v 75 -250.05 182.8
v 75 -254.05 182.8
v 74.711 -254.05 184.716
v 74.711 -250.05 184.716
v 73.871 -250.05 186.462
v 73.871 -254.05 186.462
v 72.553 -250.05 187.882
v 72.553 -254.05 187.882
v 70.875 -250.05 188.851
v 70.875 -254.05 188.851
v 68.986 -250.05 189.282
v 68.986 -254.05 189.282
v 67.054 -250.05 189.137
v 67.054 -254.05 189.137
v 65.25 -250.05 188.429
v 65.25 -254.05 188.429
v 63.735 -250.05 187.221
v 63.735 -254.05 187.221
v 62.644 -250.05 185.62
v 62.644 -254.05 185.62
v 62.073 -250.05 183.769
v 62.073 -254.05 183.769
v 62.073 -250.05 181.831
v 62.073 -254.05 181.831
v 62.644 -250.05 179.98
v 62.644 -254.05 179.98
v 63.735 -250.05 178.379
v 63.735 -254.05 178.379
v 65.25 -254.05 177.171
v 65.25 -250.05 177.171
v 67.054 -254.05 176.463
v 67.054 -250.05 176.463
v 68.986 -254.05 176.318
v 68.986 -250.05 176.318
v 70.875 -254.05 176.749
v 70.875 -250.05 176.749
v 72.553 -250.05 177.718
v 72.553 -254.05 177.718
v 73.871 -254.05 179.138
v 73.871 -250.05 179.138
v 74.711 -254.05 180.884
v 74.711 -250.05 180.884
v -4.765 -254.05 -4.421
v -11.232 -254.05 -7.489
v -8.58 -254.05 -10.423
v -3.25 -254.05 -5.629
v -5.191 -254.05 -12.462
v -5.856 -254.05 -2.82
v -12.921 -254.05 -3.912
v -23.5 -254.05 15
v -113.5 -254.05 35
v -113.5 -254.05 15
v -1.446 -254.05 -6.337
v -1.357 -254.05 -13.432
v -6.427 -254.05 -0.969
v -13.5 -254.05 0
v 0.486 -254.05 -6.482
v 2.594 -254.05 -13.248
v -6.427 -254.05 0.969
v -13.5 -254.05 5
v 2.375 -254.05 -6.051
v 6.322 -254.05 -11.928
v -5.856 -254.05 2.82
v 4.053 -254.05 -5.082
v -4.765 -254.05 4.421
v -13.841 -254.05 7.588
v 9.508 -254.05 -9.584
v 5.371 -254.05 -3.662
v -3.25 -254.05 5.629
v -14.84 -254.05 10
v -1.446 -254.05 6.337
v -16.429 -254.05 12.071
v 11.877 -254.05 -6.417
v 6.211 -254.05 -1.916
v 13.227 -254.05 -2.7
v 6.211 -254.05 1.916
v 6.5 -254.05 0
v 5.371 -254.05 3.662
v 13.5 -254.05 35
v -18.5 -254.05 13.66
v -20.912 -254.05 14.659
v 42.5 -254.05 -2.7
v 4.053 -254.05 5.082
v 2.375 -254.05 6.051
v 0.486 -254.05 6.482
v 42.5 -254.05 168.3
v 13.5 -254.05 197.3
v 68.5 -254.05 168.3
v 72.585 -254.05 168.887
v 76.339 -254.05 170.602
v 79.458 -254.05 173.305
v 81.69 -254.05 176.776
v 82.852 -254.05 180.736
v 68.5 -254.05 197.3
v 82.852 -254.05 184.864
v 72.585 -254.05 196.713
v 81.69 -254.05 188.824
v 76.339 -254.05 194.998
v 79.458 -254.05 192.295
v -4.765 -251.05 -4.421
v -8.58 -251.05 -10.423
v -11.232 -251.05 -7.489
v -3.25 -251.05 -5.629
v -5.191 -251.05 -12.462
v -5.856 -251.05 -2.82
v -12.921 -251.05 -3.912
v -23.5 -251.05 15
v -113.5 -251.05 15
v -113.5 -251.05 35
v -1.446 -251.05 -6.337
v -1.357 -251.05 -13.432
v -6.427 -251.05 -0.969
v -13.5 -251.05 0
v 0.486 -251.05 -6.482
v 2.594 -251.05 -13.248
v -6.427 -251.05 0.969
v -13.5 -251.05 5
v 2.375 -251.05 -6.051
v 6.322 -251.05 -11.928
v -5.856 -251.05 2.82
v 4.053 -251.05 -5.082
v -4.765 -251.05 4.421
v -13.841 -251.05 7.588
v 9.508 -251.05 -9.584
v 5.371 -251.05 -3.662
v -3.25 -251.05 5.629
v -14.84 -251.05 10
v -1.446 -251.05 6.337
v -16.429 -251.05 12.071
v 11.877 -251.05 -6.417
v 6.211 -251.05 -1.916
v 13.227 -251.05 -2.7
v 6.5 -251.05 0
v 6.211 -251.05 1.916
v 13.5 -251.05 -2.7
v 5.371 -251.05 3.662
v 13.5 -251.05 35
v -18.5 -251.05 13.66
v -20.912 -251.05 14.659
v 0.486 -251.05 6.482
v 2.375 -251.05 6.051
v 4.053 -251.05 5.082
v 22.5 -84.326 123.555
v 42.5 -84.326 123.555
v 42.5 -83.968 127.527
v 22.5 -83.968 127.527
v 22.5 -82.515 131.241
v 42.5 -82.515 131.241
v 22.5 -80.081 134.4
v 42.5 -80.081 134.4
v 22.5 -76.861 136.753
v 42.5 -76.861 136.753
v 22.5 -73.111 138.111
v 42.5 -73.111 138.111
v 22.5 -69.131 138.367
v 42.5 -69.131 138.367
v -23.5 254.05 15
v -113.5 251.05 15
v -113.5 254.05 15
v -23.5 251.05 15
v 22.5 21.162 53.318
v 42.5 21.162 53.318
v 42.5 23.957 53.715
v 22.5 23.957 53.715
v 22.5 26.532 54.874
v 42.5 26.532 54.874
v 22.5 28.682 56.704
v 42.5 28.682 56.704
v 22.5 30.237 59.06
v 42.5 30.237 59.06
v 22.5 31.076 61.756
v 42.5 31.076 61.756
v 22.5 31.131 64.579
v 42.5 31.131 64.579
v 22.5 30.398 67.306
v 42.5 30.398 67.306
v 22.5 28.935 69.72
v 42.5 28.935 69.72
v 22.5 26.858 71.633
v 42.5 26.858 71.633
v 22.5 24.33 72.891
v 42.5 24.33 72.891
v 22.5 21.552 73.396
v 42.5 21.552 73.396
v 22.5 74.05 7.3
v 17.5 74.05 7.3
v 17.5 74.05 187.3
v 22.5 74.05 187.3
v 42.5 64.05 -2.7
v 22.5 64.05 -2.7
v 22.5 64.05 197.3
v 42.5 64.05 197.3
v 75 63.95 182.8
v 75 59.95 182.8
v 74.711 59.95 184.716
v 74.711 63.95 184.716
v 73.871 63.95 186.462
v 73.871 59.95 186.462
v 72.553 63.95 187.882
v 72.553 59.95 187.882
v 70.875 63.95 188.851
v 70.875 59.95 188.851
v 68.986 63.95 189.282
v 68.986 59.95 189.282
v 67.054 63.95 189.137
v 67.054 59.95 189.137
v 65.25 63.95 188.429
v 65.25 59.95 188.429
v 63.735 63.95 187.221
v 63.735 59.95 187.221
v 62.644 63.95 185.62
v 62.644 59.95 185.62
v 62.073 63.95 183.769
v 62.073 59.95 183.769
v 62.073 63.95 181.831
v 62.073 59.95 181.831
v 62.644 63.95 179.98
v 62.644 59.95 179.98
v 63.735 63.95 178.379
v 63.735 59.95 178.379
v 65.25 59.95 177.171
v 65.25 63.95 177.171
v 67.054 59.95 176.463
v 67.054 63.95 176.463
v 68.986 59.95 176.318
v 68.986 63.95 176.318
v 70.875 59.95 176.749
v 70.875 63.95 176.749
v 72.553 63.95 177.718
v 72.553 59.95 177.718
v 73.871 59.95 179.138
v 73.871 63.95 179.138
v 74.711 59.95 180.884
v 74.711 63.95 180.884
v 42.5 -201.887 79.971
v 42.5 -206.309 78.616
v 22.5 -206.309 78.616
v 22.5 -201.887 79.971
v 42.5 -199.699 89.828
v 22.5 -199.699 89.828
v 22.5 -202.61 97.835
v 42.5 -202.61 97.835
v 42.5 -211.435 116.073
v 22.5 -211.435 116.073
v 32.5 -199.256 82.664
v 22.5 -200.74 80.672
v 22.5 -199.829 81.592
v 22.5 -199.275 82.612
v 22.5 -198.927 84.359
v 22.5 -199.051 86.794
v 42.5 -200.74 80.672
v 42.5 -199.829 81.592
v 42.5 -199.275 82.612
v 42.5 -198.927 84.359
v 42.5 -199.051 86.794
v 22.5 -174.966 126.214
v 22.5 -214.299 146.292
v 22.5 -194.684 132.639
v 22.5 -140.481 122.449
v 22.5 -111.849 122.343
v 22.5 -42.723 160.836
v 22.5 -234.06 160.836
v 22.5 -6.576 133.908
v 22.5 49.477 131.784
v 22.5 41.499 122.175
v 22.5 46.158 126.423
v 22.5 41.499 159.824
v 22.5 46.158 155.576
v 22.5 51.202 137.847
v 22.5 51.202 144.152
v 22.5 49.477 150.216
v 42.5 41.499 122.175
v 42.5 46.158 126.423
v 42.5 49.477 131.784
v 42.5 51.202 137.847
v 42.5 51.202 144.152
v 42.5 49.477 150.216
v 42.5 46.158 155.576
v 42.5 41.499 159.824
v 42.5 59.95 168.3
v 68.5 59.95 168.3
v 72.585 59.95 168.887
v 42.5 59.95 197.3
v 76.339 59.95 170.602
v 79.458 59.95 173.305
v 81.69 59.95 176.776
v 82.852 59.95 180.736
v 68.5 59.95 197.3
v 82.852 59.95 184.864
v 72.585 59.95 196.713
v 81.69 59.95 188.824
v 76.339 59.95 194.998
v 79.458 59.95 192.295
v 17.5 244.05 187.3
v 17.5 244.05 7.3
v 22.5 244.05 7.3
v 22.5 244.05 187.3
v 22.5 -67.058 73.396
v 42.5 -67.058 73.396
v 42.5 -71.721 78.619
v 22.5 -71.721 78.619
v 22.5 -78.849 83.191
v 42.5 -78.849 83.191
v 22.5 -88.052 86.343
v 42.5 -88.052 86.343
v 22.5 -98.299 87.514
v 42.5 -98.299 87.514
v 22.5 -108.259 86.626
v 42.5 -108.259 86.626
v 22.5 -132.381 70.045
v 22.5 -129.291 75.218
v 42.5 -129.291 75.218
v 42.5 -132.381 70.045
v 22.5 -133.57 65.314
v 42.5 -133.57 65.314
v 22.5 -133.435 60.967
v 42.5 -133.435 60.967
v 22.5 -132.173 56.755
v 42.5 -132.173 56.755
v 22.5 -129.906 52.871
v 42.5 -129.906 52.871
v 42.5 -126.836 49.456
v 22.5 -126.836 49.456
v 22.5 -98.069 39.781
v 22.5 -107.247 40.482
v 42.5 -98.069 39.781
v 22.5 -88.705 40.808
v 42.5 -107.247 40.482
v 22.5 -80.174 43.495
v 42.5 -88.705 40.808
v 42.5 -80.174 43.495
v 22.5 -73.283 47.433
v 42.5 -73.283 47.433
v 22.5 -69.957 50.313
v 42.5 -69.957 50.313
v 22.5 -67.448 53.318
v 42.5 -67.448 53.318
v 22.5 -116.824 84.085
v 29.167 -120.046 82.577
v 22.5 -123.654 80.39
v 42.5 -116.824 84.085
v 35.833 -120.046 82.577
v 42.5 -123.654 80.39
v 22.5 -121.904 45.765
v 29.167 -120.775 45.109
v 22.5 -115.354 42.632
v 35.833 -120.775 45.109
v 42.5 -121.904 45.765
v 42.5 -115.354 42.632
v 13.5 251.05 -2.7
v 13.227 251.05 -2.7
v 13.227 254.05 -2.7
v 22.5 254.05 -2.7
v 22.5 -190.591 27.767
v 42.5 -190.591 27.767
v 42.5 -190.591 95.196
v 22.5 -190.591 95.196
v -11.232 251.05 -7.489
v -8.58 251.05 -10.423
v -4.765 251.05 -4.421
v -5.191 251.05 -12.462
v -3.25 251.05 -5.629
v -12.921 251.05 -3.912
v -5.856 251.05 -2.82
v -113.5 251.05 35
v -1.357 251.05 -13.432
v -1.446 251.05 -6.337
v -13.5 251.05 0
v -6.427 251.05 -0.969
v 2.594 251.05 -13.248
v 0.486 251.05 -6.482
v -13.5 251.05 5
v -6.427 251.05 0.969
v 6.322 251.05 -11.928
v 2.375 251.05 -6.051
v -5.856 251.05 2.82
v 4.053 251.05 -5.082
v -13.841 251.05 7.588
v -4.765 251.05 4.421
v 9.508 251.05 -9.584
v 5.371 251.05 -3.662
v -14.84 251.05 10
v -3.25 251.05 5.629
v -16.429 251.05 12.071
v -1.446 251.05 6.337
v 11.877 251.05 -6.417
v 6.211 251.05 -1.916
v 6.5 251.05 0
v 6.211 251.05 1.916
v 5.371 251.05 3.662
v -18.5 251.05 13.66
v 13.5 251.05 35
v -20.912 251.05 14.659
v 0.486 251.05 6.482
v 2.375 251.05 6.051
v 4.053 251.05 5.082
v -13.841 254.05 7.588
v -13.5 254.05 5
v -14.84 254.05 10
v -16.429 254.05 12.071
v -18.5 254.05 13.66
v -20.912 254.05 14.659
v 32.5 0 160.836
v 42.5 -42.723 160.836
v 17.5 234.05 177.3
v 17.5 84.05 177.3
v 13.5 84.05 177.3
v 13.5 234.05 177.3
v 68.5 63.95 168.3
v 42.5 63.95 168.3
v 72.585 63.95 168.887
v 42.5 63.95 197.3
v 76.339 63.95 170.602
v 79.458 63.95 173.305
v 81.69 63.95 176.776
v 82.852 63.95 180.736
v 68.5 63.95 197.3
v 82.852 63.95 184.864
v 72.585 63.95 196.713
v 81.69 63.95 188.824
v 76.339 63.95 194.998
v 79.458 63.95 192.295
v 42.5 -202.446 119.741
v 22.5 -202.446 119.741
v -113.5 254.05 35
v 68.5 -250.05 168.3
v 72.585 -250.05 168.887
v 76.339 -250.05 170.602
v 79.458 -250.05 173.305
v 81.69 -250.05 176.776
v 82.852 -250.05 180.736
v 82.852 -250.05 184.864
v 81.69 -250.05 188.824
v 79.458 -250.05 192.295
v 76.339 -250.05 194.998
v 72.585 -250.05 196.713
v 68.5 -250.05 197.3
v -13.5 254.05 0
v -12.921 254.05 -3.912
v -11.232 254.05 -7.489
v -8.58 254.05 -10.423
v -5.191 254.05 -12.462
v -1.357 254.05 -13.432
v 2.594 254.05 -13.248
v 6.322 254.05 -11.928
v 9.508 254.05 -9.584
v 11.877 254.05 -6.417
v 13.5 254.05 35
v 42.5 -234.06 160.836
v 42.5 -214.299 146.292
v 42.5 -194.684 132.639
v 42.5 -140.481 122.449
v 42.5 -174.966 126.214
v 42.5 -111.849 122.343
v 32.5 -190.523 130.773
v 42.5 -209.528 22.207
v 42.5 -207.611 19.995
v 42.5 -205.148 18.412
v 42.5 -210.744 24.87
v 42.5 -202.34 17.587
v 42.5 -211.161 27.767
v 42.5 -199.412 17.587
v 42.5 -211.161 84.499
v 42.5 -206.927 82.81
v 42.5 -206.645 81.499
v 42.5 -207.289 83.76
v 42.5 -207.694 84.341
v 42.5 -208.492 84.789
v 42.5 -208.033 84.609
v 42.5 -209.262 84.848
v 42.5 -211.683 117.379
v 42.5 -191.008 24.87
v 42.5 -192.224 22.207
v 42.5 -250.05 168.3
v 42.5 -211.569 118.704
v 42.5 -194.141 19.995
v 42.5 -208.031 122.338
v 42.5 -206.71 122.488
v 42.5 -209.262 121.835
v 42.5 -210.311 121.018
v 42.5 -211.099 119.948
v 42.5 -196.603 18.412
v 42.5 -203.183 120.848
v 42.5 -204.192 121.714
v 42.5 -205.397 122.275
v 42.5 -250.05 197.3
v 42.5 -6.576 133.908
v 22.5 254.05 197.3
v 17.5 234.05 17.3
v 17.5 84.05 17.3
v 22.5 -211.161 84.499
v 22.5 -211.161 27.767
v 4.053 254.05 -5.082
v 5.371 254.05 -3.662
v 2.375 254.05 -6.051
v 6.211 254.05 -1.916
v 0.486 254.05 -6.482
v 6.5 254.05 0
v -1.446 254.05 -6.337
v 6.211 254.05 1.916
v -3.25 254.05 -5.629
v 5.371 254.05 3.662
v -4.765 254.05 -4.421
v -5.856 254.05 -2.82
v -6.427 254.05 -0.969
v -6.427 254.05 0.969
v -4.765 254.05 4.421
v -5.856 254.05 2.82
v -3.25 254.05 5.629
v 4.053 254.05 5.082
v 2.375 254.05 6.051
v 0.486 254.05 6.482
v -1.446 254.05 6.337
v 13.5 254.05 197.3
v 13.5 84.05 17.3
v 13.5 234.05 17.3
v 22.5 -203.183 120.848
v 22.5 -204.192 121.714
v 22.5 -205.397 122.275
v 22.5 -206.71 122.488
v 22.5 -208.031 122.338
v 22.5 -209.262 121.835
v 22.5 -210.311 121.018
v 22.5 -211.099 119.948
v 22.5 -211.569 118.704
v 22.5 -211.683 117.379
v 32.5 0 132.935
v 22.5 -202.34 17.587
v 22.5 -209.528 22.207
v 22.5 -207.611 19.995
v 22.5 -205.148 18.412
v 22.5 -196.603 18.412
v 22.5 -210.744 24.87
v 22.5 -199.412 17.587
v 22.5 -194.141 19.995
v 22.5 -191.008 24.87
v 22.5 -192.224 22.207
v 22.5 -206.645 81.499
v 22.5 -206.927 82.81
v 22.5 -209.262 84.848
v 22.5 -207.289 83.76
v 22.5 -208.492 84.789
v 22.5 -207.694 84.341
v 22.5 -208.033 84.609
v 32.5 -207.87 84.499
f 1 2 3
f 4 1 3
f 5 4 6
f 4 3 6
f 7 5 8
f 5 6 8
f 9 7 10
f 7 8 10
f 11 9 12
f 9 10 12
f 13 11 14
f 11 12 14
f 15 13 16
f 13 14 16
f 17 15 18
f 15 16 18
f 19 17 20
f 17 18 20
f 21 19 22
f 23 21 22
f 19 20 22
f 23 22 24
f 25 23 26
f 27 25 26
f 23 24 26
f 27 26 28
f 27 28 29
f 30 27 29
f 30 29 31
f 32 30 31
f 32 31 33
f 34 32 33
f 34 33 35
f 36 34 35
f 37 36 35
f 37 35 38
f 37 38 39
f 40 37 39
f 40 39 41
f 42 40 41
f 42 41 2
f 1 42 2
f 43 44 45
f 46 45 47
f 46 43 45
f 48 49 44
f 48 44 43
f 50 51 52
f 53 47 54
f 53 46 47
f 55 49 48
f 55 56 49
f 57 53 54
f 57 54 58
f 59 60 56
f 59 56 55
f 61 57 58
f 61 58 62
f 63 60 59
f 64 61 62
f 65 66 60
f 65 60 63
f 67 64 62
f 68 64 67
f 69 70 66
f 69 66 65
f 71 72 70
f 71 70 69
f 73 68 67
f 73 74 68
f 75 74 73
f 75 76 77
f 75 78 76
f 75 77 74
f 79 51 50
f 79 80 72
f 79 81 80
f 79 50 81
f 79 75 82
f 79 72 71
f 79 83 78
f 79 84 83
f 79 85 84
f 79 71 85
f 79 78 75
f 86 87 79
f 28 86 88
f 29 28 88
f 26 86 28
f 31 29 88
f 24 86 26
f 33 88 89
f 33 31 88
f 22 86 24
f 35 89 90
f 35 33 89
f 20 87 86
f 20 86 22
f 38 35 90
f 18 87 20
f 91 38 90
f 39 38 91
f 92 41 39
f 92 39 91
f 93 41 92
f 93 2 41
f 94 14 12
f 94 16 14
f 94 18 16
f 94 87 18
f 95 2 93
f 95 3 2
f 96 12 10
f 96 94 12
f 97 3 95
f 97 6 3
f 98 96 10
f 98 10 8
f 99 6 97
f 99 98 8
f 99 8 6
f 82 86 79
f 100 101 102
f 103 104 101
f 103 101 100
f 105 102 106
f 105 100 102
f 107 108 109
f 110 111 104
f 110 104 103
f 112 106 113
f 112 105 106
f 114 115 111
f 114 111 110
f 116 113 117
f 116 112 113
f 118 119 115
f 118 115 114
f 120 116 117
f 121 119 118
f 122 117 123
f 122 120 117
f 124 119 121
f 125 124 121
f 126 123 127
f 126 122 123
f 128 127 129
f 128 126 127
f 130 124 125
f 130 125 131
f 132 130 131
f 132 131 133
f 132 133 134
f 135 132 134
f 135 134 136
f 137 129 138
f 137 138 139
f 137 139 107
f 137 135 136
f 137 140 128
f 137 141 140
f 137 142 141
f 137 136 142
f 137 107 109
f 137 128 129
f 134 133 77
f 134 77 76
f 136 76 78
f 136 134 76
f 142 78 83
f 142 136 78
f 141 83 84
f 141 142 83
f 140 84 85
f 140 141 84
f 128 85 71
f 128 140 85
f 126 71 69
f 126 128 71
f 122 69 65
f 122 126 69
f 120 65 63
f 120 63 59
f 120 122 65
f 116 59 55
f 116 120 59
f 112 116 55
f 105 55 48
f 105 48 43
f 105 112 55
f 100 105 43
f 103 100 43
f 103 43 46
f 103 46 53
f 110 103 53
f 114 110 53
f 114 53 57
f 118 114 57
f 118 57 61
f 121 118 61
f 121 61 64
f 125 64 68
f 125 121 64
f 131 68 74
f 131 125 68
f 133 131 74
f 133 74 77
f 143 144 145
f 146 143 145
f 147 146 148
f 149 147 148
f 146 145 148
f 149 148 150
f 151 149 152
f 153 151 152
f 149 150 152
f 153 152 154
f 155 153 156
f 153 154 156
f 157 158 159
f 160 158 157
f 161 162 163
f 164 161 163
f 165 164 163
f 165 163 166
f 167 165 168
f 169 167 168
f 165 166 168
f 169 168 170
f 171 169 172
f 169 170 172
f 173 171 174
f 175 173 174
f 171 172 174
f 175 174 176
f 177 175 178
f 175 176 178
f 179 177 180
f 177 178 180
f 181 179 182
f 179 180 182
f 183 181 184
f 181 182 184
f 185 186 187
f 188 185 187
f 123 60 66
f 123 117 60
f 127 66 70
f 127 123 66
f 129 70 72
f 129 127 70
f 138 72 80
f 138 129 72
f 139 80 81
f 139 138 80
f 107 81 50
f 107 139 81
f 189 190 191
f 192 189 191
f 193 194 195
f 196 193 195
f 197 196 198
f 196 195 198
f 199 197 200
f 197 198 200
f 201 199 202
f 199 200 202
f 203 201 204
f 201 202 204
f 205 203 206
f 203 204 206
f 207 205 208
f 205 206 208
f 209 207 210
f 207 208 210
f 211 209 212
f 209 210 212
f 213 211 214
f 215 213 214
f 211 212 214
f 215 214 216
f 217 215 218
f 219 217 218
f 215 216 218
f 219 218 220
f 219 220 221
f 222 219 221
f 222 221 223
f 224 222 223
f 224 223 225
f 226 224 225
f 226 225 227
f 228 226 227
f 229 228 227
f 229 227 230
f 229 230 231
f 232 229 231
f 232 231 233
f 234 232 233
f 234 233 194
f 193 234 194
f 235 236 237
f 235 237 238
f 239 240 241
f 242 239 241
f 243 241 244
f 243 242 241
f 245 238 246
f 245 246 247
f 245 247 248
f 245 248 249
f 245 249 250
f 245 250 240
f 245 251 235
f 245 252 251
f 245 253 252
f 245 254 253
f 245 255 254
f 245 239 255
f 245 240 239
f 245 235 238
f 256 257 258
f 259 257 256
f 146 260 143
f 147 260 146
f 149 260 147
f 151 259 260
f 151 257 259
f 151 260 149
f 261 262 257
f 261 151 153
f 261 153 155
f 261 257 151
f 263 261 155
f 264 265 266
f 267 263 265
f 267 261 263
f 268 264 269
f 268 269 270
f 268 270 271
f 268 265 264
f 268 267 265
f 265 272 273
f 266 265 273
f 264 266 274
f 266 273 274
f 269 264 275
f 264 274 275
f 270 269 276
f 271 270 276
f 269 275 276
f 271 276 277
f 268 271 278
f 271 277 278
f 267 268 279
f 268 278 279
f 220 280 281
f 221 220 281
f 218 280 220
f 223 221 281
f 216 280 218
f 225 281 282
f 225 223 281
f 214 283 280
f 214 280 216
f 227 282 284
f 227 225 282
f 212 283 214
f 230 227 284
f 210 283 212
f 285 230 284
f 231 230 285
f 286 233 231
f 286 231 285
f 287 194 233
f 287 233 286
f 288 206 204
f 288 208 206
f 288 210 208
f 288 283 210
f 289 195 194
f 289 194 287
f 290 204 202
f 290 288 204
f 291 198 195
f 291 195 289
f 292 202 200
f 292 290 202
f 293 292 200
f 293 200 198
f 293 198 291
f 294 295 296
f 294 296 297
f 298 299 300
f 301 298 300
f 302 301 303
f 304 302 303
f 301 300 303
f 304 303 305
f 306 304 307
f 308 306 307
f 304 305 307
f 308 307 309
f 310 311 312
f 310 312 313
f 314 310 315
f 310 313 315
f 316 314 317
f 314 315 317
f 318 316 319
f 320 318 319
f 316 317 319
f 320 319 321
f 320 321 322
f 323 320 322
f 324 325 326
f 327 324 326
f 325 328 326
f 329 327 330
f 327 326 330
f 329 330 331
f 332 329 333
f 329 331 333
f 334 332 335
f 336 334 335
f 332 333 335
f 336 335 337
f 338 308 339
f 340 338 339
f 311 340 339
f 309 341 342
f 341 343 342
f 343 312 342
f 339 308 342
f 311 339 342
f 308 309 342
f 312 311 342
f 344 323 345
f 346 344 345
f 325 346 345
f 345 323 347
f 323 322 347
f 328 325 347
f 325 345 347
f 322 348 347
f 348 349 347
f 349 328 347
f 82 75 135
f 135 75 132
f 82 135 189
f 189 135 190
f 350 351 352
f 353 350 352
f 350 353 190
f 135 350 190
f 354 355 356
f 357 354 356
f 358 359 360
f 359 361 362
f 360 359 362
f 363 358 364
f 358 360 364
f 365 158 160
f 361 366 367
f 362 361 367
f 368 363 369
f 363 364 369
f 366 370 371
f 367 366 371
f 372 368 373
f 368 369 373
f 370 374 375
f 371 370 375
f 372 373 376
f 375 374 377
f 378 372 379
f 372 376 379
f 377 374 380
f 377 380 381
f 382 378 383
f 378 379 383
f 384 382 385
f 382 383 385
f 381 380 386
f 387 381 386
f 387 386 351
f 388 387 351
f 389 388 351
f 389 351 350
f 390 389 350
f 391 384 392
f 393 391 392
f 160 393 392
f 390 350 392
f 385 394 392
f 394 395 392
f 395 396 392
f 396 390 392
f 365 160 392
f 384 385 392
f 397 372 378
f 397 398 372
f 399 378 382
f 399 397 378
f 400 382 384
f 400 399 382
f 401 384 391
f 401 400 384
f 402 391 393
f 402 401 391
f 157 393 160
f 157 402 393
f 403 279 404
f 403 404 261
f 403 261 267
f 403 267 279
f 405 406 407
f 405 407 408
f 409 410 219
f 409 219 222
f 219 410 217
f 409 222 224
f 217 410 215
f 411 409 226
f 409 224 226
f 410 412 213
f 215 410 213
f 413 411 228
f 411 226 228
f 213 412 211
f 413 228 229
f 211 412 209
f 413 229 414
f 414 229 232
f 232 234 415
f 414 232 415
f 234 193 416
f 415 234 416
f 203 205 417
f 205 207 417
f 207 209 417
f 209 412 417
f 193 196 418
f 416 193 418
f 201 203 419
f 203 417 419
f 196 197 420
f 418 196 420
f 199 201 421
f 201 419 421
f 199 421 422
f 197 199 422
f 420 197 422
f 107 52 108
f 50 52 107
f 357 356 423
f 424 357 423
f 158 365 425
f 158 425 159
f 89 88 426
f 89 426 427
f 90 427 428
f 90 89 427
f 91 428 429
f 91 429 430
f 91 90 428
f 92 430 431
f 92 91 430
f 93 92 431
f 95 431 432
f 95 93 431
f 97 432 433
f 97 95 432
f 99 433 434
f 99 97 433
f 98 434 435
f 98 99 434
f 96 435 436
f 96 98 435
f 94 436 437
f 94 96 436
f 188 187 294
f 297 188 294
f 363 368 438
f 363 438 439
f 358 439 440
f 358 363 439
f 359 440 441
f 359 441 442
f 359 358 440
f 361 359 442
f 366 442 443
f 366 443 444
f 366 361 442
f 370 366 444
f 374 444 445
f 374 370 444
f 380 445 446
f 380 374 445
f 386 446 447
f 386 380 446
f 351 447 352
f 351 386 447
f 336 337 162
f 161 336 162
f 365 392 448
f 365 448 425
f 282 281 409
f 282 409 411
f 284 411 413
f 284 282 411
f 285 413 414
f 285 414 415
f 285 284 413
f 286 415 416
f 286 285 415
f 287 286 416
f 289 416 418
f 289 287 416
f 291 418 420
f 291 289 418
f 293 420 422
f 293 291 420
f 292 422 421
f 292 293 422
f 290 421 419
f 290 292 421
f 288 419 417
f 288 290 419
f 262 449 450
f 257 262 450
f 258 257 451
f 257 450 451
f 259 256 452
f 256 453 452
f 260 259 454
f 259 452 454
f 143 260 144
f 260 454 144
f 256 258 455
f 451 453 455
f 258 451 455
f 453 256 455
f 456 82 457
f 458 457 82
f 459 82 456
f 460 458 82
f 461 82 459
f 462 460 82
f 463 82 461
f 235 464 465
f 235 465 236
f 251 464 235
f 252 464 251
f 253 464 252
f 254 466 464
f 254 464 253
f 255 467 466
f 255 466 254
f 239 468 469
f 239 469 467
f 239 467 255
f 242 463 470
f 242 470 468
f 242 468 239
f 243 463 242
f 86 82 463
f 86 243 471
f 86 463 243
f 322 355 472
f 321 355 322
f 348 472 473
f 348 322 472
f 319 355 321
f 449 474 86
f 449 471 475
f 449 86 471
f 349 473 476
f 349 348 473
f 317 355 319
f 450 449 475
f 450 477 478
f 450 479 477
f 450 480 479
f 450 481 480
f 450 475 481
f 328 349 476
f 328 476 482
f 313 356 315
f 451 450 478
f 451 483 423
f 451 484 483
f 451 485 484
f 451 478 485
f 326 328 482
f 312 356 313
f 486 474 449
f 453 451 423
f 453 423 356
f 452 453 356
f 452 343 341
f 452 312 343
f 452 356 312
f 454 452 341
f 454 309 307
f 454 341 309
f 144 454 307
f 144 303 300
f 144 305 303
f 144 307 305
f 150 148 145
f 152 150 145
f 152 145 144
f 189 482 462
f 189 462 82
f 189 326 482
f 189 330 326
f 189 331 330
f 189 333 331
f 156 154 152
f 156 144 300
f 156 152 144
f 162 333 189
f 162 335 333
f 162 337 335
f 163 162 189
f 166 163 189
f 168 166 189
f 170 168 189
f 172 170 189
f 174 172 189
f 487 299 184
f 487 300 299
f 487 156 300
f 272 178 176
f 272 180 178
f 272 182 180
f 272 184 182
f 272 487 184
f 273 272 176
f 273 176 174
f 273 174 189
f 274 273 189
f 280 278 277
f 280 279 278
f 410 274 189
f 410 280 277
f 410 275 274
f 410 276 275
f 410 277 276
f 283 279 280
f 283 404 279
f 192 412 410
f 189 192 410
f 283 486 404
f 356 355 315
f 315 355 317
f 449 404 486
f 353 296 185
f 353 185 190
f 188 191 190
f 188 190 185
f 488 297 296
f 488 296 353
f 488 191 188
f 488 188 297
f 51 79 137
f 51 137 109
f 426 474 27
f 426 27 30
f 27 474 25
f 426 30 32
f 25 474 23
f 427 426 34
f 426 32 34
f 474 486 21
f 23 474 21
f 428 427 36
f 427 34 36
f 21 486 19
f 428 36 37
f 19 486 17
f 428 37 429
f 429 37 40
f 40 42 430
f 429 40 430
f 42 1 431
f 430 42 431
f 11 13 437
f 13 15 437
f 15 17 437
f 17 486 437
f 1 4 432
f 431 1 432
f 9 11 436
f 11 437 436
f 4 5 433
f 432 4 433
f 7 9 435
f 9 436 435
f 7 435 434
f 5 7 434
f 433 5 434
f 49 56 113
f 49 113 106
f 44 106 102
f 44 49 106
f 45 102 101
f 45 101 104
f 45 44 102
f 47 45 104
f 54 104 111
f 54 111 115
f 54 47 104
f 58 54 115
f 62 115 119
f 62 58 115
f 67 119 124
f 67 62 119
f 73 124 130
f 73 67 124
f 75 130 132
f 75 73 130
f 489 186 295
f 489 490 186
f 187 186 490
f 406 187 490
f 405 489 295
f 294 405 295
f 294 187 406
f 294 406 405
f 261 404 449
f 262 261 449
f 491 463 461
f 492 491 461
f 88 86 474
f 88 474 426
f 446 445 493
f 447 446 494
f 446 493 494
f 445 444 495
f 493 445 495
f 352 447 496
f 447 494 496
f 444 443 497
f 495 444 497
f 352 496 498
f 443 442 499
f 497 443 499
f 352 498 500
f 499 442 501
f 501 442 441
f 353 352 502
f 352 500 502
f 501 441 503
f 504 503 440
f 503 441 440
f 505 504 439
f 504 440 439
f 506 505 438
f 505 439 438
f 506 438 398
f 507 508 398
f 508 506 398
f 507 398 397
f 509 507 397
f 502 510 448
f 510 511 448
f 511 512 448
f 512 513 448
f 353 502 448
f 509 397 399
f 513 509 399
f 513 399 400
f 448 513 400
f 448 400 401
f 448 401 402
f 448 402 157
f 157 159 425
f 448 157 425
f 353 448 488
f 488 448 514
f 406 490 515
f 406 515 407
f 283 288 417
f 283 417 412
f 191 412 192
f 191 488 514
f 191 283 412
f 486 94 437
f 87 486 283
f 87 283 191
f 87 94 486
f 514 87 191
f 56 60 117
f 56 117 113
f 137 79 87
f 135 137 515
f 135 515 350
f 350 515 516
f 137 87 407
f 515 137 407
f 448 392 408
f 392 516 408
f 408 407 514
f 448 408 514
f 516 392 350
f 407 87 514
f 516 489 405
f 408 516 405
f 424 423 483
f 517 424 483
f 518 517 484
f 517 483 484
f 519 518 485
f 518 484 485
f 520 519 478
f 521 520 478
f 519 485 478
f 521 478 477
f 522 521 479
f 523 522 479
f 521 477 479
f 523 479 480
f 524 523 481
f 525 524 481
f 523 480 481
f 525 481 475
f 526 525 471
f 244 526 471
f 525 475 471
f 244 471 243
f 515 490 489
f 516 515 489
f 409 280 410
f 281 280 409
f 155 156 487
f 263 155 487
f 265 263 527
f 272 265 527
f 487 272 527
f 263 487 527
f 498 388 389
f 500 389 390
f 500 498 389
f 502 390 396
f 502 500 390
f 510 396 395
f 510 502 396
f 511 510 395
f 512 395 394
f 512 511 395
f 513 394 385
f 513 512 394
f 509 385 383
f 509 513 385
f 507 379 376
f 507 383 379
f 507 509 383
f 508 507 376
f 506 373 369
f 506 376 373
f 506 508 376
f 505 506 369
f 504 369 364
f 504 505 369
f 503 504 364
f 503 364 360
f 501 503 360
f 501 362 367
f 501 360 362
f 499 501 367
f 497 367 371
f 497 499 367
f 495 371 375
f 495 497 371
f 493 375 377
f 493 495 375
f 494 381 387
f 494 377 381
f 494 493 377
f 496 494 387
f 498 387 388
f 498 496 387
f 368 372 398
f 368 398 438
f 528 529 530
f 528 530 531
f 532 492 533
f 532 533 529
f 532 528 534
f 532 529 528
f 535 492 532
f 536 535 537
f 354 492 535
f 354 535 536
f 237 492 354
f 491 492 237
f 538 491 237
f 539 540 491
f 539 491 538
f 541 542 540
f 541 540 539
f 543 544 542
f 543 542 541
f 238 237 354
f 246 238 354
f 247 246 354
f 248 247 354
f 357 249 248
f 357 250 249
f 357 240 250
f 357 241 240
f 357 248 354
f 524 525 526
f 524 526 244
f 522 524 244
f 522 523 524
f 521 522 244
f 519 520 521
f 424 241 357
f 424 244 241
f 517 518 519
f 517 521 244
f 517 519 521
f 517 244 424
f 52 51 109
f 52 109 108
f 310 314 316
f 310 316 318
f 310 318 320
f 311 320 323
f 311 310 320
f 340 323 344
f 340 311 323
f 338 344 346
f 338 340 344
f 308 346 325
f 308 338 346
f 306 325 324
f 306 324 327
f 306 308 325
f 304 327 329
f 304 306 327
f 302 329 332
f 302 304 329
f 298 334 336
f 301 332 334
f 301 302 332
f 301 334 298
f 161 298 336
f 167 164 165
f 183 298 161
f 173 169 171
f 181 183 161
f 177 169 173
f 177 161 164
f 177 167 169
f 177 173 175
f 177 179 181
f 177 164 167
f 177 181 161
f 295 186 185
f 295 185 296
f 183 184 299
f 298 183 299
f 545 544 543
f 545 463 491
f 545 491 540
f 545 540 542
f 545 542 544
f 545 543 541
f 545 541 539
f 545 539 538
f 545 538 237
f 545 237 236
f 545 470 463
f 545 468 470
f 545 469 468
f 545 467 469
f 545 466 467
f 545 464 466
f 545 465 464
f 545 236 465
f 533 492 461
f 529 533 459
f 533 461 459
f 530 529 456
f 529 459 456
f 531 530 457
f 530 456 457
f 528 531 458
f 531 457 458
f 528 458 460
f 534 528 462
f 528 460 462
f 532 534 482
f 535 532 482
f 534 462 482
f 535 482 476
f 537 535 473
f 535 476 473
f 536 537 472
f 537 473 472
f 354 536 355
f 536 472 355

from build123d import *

# Parameters (mm, degrees)
F0_R      = 6.5
F1_DEPTH  = 254.05
F2_W      = 502.1
F2_H      = 100
F3_DEPTH  = 140
F4_R      = 10
F5_W      = 508.1
F5_H      = 200
F6_DEPTH  = 4
F7_W      = 150
F7_H      = 160
F8_DEPTH  = 25
F9_W      = 190
F9_H      = 200
F10_DEPTH = 5
F11_W     = 170
F11_H     = 180
F12_DEPTH = 25
F13_W     = 318.1
F13_H     = 200
F14_DEPTH = 25
F16_DEPTH = 20
F17_R     = 6.5
F18_DEPTH = 318
F19_W     = 52
F19_H     = 310
F20_DEPTH = 30


with BuildPart() as f1:
    # F0 (on Front) → F1 (new body, symmetric)
    with BuildSketch(Plane.XZ):
        with BuildLine():
            Line((-13.5, 15), (-13.5, 0))
            ThreePointArc((-13.5, 0), (-1.3568709871, -13.4316380656), (13.227244611, -2.7))
            Line((13.227244611, -2.7), (13.5, -2.7))
            Line((13.5, -2.7), (13.5, 15))
            Line((13.5, 15), (13.5, 35))
            Line((13.5, 35), (-113.5, 35))
            Line((-113.5, 35), (-113.5, 15))
            Line((-113.5, 15), (-13.5, 15))
        make_face()
        Circle(F0_R, mode=Mode.SUBTRACT)
    extrude(amount=F1_DEPTH, both=True)

    # F2 (on face) → F3 (cut)
    with BuildSketch(Plane.YZ.offset(13.5)):
        Rectangle(F2_W, F2_H)
    extrude(amount=-F3_DEPTH, mode=Mode.SUBTRACT)

    # F4
    f4_edges = [f1.edges().sort_by_distance(p)[0] for p in [
        (-13.5, -252.55, 15),
        (-13.5, 252.55, 15),
    ]]
    fillet(f4_edges, radius=F4_R)

    # F5 (on face) → F6 (join)
    with BuildSketch(Plane.YZ.offset(13.5)):
        with Locations((0, 97.3)):
            Rectangle(F5_W, F5_H)
    extrude(amount=F6_DEPTH)

    # F7 (on face) → F8 (cut)
    with BuildSketch(Plane.YZ.offset(17.5)):
        with Locations((159.05, 97.3)):
            Rectangle(F7_W, F7_H)
    extrude(amount=-F8_DEPTH, mode=Mode.SUBTRACT)

    # F9 (on face) → F10 (join)
    with BuildSketch(Plane.YZ.offset(17.5)):
        with Locations((159.05, 97.3)):
            Rectangle(F9_W, F9_H)
    extrude(amount=F10_DEPTH)

    # F11 (on face) → F12 (cut)
    with BuildSketch(Plane.YZ.offset(17.5)):
        with Locations((159.05, 97.3)):
            Rectangle(F11_W, F11_H)
    extrude(amount=F12_DEPTH, mode=Mode.SUBTRACT)

    # F13 (on face) → F14 (join)
    with BuildSketch(Plane.YZ.offset(17.5)):
        with Locations((-95, 97.3)):
            Rectangle(F13_W, F13_H)
    extrude(amount=F14_DEPTH)

    # F15 (on face) → F16 (cut)
    with BuildSketch(Plane.YZ.offset(42.5)):
        with BuildLine():
            Line((-42.7234955132, 160.8355042394), (-234.0602389828, 160.8355042394))
            add(Edge.make_bspline(
                [(-234.0602389828, 160.8355042394), (-217.1074327426, 151.3089947091), (-196.7785844767, 119.4842501759), (-119.2925410931, 121.4843631106), (-84.3255399594, 123.5550247597)],
                knots=[0, 0, 0, 0, 0.4134970992, 1, 1, 1, 1], degree=3))
            ThreePointArc((-84.3255399594, 123.5550247597), (-80.0809052846, 134.4004465368), (-69.1307716391, 138.367141659))
            add(Edge.make_bspline(
                [(-69.1307716391, 138.367141659), (-47.0103981225, 137.0126396602), (1.6618247246, 135.6066305681), (26.4505103488, 126.2112086953), (41.4993381181, 122.1753671593)],
                knots=[0, 0, 0, 0, 0.5598213266, 1, 1, 1, 1], degree=3))
            ThreePointArc((41.4993381181, 122.1753671593), (51.4208114186, 140.9997574198), (41.4993381181, 159.8241476803))
            add(Edge.make_bspline(
                [(-42.7234955132, 160.8355042394), (-27.0416883232, 160.9222176304), (-1.4651588493, 161.1197494684), (29.1631212378, 160.1908804879), (41.4993381181, 159.8241476803)],
                knots=[0, 0, 0, 0, 0.5035967712, 1, 1, 1, 1], degree=3))
        make_face()
        with BuildLine():
            Line((21.5523498238, 73.3963885321), (-67.0575042699, 73.3963885321))
            add(Edge.make_bspline(
                [(-67.0575042699, 73.3963885321), (-85.0711185917, 100.9948365173), (-120.0462196172, 82.577282884), (-155.0213206427, 64.1597292506), (-120.7750741023, 45.1092301127), (-86.5288275619, 26.0587309749), (-67.4480830546, 53.317995912)],
                knots=[0.4207699255, 0.4207699255, 0.4207699255, 2.2257610437, 2.2257610437, 4.0307521619, 4.0307521619, 5.83574328, 5.83574328, 5.83574328], degree=2, weights=[1, 0.6196531961, 1, 0.6196531961, 1, 0.6196531961, 1]))
            Line((-67.4480830546, 53.317995912), (21.1617710391, 53.317995912))
            ThreePointArc((21.1617710391, 53.317995912), (31.2028666218, 63.1656647881), (21.5523498238, 73.3963885321))
        make_face()
        with BuildLine():
            ThreePointArc((-211.1607789993, 27.7673769742), (-200.8758932352, 17.4824912101), (-190.5910074711, 27.7673769742))
            Line((-190.5910074711, 27.7673769742), (-190.5910074711, 78.6157455295))
            Line((-190.5910074711, 78.6157455295), (-190.5910074711, 95.1955616474))
            Line((-190.5910074711, 95.1955616474), (-202.446475625, 119.7409853339))
            ThreePointArc((-202.446475625, 119.7409853339), (-208.6635845365, 122.1287897822), (-211.4351242781, 116.0729974508))
            add(Edge.make_bspline(
                [(-206.3090205193, 78.6157455295), (-203.2636096895, 79.3219361096), (-193.8499770894, 81.5048332746), (-204.3392460287, 102.1242097799), (-211.4351242781, 116.0729974508)],
                knots=[0, 0, 0, 0, 0.3235106955, 1, 1, 1, 1], degree=3))
            add(Edge.make_bspline(
                [(-211.1607789993, 84.4994708896), (-209.9125958931, 84.8049572899), (-206.9667390663, 85.5259406083), (-206.5494822717, 81.1421112915), (-206.3090205193, 78.6157455295)],
                knots=[0, 0, 0, 0, 0.4237080006, 1, 1, 1, 1], degree=3))
            Line((-211.1607789993, 84.4994708896), (-211.1607789993, 78.6157455295))
            Line((-211.1607789993, 78.6157455295), (-211.1607789993, 27.7673769742))
        make_face()
    extrude(amount=-F16_DEPTH, mode=Mode.SUBTRACT)

    # F17 (on face) → F18 (join)
    with BuildSketch(Plane.XZ.offset(254.05)):
        with BuildLine():
            Line((68.5, 197.3), (42.5, 197.3))
            Line((42.5, 197.3), (42.5, 168.3))
            Line((42.5, 168.3), (68.5, 168.3))
            ThreePointArc((68.5, 168.3), (83, 182.8), (68.5, 197.3))
        make_face()
        with Locations((68.5, 182.8)):
            Circle(F17_R, mode=Mode.SUBTRACT)
    extrude(amount=-F18_DEPTH)

    # F19 (on face) → F20 (cut)
    with BuildSketch(Plane.XY.offset(197.3)):
        with Locations((68.5, -95.05)):
            Rectangle(F19_W, F19_H)
    extrude(amount=-F20_DEPTH, mode=Mode.SUBTRACT)


solid = f1.part
